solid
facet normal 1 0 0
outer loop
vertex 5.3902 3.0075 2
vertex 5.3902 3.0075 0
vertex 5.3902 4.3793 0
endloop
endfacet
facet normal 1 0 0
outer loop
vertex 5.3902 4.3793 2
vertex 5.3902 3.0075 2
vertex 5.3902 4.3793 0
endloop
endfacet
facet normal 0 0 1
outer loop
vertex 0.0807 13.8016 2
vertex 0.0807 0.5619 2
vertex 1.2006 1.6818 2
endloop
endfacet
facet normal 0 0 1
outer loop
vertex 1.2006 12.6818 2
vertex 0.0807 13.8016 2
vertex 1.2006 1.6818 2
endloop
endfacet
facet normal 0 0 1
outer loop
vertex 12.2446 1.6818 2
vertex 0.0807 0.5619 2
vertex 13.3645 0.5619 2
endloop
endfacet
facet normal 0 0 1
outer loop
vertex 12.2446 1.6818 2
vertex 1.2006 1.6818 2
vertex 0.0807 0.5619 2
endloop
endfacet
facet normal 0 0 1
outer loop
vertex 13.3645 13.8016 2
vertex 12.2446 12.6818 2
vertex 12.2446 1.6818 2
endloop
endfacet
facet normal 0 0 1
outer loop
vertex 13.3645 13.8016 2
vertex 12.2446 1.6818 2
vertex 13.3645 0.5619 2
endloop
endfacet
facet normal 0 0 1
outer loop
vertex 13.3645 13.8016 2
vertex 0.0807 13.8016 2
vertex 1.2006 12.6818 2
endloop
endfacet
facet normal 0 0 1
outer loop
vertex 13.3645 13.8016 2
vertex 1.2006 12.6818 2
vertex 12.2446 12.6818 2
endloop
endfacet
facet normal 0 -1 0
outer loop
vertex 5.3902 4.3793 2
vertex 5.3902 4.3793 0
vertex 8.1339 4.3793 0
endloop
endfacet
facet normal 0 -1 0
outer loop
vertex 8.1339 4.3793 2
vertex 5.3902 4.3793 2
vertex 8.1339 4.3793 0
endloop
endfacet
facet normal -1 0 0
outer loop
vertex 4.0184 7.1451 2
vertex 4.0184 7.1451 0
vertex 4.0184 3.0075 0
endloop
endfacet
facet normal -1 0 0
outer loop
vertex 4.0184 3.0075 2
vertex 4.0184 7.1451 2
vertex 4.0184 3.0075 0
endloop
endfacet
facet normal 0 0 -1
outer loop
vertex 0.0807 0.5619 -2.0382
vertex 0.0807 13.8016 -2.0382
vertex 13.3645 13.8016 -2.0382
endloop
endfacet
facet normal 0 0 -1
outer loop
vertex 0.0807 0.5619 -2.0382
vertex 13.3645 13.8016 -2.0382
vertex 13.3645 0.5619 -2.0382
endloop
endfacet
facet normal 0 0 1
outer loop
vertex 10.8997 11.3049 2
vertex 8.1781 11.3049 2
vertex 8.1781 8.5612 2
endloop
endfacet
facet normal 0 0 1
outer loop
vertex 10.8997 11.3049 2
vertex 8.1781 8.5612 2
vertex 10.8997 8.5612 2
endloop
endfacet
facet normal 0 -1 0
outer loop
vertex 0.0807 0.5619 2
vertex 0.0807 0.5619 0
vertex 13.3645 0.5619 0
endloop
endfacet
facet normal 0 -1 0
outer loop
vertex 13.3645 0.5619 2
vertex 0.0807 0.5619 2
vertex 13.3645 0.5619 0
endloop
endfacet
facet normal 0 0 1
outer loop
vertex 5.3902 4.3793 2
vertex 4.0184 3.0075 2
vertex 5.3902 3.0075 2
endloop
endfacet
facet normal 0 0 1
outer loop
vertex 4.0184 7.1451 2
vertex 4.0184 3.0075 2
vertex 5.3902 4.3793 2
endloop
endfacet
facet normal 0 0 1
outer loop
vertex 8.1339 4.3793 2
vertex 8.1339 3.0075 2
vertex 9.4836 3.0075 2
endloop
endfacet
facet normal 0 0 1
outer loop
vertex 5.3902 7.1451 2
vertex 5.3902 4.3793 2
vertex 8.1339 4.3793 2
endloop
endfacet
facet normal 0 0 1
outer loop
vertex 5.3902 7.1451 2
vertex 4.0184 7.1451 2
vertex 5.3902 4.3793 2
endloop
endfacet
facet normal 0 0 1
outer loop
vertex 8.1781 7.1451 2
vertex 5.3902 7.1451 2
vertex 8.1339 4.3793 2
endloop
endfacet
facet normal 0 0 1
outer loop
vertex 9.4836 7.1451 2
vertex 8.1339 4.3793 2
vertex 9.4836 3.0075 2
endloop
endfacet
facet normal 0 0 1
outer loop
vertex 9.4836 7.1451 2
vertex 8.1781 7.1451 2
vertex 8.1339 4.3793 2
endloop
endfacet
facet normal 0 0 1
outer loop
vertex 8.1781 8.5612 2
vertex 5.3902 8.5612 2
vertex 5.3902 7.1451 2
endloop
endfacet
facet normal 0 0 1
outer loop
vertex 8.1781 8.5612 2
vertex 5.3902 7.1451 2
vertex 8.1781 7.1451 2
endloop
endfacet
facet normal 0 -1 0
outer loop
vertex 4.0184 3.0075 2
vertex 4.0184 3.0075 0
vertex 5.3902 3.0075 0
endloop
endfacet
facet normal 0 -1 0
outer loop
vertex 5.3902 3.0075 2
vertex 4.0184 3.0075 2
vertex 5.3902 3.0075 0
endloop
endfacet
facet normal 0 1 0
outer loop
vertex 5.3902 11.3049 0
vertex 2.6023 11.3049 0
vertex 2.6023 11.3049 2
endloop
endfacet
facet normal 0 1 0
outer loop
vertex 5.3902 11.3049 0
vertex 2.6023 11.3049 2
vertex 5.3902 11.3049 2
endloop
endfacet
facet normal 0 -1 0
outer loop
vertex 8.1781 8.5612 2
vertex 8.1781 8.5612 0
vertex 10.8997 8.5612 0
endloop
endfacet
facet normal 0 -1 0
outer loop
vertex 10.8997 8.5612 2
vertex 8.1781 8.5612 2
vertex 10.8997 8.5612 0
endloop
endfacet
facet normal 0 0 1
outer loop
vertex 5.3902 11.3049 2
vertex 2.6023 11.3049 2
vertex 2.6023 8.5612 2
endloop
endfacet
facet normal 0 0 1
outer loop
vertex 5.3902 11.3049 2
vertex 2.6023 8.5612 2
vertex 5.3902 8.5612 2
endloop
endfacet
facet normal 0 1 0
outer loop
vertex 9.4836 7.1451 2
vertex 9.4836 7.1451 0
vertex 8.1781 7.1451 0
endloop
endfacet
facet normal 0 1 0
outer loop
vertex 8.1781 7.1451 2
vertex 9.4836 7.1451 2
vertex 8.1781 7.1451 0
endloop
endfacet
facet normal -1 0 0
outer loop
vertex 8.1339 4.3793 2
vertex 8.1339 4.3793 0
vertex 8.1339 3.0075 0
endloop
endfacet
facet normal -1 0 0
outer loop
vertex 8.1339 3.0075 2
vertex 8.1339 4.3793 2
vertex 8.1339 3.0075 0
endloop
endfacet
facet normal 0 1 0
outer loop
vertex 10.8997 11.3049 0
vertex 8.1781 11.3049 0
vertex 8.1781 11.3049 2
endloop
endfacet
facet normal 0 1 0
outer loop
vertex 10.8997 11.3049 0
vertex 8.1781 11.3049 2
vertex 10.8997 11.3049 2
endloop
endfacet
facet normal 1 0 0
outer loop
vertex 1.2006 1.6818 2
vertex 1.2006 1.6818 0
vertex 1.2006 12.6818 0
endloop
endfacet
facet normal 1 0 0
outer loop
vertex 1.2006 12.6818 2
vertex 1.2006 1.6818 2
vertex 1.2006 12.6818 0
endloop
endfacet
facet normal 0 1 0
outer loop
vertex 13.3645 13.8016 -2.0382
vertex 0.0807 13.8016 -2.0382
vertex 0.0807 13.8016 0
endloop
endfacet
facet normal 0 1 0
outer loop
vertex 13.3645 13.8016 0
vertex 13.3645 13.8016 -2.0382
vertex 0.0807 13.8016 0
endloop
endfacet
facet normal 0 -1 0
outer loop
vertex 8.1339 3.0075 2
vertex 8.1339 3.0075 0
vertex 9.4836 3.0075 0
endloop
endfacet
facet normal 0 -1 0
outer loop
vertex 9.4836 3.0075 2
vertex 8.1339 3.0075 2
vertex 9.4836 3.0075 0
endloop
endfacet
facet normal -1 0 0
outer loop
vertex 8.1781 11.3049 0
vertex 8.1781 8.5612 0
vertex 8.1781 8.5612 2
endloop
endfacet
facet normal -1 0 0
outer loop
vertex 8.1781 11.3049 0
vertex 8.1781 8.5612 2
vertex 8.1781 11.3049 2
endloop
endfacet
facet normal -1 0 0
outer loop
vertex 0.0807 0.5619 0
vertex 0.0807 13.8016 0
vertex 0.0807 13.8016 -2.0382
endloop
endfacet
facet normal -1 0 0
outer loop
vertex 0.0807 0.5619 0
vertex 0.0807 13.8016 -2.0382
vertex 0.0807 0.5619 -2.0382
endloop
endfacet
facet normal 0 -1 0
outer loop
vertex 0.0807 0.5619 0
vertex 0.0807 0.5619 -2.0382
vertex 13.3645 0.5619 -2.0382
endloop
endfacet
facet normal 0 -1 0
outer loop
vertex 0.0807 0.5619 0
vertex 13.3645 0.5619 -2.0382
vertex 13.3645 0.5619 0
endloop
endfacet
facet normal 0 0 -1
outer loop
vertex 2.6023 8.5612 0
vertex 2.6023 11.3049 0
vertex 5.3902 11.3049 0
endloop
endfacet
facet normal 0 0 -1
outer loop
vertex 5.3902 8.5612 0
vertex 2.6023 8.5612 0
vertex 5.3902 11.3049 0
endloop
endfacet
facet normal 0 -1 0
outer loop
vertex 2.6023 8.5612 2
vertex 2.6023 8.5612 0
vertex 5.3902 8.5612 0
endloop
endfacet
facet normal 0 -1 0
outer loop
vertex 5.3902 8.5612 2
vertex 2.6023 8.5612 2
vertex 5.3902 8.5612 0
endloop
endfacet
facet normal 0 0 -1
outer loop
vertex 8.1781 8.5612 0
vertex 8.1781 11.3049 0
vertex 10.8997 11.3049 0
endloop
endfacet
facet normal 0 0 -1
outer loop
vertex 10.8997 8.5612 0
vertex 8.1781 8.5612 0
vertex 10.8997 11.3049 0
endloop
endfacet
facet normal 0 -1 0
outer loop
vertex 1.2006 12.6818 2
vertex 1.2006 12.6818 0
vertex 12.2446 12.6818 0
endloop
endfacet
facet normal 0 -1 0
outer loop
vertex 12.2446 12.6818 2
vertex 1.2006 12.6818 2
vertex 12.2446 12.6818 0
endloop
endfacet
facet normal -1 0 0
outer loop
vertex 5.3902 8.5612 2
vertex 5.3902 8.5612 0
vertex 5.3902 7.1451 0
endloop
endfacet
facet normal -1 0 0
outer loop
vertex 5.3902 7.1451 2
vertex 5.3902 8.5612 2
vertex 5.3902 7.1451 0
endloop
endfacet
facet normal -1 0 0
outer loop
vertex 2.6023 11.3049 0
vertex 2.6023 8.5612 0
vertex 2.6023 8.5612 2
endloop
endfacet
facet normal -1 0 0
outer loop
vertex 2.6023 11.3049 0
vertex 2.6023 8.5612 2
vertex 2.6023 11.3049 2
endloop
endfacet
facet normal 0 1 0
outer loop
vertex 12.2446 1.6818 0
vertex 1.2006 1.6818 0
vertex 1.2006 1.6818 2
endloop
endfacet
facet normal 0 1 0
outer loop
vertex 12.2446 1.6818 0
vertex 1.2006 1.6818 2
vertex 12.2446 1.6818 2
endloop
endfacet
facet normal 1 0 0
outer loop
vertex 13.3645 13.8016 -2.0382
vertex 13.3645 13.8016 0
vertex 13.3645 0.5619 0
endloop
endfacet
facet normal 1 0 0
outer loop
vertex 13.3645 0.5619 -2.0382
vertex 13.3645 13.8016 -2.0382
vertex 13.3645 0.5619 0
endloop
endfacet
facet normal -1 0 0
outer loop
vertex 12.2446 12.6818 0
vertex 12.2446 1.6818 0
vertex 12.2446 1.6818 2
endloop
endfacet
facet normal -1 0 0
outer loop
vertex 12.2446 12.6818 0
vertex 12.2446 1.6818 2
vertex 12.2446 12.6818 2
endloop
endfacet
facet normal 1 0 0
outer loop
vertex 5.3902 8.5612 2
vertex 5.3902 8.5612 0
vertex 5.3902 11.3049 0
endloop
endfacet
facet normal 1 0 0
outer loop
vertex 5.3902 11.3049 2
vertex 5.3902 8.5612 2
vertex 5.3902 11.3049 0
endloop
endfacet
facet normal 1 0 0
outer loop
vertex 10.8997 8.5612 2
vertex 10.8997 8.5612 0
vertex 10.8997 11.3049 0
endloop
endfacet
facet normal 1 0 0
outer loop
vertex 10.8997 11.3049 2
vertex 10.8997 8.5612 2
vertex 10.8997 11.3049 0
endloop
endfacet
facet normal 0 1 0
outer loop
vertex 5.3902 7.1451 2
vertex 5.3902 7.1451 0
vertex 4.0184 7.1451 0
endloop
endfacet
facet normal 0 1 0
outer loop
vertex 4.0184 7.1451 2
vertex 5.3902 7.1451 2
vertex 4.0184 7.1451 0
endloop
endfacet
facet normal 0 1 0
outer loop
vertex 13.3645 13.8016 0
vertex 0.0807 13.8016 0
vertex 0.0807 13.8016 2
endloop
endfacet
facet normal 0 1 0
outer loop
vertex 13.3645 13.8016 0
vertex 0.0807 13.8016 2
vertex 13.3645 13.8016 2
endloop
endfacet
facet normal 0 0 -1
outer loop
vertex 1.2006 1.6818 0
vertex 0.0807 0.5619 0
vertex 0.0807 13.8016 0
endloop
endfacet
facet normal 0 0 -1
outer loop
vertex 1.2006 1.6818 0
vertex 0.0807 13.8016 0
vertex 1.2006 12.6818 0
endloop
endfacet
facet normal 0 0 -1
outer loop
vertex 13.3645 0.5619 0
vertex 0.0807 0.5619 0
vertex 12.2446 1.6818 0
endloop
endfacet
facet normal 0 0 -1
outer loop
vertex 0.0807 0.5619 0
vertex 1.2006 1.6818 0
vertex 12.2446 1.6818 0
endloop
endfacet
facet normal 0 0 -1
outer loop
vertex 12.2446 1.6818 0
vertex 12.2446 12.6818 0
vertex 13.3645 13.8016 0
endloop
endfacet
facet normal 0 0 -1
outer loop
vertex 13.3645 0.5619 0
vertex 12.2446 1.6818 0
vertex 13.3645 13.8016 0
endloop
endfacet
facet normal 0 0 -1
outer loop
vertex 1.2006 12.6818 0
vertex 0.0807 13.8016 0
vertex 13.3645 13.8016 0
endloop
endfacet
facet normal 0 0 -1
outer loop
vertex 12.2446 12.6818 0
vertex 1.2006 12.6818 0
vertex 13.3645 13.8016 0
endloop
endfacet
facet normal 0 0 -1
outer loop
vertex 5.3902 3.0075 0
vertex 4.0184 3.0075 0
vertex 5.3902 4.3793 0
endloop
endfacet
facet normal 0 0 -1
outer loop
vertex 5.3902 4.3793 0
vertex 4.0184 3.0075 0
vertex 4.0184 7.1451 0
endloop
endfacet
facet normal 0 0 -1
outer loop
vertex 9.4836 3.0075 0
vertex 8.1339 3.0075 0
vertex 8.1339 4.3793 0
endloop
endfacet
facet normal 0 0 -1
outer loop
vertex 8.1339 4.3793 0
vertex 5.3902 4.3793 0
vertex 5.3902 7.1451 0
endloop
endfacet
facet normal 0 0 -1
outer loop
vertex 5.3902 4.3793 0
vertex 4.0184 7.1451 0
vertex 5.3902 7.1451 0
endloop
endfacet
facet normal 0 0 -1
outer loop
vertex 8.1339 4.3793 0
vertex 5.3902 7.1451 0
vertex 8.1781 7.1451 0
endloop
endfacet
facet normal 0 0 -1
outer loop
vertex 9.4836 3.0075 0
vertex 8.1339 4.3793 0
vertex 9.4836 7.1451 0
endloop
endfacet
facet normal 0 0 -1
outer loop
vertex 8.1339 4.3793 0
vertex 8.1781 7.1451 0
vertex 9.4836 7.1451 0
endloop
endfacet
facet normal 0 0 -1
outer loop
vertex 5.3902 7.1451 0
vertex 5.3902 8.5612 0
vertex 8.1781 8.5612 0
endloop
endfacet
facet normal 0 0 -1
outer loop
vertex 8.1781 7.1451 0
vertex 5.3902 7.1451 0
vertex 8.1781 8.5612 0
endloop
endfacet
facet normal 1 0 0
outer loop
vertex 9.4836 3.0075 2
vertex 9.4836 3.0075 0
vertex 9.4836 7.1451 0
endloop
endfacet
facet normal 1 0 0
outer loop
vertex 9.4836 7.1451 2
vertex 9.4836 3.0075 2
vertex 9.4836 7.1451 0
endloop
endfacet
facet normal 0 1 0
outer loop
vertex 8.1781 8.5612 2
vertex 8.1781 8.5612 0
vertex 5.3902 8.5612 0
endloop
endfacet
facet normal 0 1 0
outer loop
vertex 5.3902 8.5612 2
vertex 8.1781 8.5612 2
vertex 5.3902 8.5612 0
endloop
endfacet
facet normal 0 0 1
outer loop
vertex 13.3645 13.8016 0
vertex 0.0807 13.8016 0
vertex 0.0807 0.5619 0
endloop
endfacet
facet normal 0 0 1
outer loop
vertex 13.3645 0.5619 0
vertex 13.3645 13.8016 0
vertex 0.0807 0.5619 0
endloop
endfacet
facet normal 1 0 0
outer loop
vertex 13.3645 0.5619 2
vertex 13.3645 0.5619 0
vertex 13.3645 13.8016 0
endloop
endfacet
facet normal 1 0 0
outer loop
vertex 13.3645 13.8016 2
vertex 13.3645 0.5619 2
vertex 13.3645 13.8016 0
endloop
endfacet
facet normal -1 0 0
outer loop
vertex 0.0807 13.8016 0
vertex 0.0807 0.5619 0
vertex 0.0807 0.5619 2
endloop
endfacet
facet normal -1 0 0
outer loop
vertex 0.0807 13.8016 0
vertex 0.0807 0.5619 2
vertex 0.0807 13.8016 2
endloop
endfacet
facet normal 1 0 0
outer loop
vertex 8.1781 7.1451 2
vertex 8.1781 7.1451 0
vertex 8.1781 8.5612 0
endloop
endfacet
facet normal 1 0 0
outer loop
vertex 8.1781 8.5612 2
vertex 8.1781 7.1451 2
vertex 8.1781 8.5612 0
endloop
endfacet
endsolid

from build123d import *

# Parameters (mm, degrees)
F0_W     = 13.28378
F0_H     = 13.23978
F0_W_2   = 11.044
F0_H_2   = 11
F0_W_3   = 2.787907
F0_H_3   = 2.743654
F0_W_4   = 2.721528
F1_DEPTH = 2
F2_W     = 13.23978
F2_H     = 2.038168
F3_DEPTH = 13.28378


with BuildPart() as f1:
    # F0 (on Top) → F1 (new body)
    with BuildSketch(Plane.XY):
        with Locations((6.722622, 7.181752)):
            Rectangle(F0_W, F0_H)
        with Locations((6.722622, 7.181752)):
            Rectangle(F0_W_2, F0_H_2, mode=Mode.SUBTRACT)
        Polygon((8.178124, 8.561203), (5.390218, 8.561203), (5.390218, 7.145124), (4.018391, 7.145124), (4.018391, 3.007516), (5.390218, 3.007516), (5.390218, 4.379343), (8.133872, 4.379343), (8.133872, 3.007516), (9.483573, 3.007516), (9.483573, 7.145124), (8.178124, 7.145124), align=None)
        with Locations((3.996264, 9.93303)):
            Rectangle(F0_W_3, F0_H_3)
        with Locations((9.538888, 9.93303)):
            Rectangle(F0_W_4, F0_H_3)
    extrude(amount=F1_DEPTH)


with BuildPart() as f3:
    # F2 (on face) → F3 (new body, through all)
    with BuildSketch(Plane(origin=(0.080732, 0, 0), x_dir=(0, -1, 0), z_dir=(-1, 0, 0))):
        with Locations((-7.181752, -1.019084)):
            Rectangle(F2_W, F2_H)
    extrude(amount=-F3_DEPTH)


solid = Compound([f1.part, f3.part])
